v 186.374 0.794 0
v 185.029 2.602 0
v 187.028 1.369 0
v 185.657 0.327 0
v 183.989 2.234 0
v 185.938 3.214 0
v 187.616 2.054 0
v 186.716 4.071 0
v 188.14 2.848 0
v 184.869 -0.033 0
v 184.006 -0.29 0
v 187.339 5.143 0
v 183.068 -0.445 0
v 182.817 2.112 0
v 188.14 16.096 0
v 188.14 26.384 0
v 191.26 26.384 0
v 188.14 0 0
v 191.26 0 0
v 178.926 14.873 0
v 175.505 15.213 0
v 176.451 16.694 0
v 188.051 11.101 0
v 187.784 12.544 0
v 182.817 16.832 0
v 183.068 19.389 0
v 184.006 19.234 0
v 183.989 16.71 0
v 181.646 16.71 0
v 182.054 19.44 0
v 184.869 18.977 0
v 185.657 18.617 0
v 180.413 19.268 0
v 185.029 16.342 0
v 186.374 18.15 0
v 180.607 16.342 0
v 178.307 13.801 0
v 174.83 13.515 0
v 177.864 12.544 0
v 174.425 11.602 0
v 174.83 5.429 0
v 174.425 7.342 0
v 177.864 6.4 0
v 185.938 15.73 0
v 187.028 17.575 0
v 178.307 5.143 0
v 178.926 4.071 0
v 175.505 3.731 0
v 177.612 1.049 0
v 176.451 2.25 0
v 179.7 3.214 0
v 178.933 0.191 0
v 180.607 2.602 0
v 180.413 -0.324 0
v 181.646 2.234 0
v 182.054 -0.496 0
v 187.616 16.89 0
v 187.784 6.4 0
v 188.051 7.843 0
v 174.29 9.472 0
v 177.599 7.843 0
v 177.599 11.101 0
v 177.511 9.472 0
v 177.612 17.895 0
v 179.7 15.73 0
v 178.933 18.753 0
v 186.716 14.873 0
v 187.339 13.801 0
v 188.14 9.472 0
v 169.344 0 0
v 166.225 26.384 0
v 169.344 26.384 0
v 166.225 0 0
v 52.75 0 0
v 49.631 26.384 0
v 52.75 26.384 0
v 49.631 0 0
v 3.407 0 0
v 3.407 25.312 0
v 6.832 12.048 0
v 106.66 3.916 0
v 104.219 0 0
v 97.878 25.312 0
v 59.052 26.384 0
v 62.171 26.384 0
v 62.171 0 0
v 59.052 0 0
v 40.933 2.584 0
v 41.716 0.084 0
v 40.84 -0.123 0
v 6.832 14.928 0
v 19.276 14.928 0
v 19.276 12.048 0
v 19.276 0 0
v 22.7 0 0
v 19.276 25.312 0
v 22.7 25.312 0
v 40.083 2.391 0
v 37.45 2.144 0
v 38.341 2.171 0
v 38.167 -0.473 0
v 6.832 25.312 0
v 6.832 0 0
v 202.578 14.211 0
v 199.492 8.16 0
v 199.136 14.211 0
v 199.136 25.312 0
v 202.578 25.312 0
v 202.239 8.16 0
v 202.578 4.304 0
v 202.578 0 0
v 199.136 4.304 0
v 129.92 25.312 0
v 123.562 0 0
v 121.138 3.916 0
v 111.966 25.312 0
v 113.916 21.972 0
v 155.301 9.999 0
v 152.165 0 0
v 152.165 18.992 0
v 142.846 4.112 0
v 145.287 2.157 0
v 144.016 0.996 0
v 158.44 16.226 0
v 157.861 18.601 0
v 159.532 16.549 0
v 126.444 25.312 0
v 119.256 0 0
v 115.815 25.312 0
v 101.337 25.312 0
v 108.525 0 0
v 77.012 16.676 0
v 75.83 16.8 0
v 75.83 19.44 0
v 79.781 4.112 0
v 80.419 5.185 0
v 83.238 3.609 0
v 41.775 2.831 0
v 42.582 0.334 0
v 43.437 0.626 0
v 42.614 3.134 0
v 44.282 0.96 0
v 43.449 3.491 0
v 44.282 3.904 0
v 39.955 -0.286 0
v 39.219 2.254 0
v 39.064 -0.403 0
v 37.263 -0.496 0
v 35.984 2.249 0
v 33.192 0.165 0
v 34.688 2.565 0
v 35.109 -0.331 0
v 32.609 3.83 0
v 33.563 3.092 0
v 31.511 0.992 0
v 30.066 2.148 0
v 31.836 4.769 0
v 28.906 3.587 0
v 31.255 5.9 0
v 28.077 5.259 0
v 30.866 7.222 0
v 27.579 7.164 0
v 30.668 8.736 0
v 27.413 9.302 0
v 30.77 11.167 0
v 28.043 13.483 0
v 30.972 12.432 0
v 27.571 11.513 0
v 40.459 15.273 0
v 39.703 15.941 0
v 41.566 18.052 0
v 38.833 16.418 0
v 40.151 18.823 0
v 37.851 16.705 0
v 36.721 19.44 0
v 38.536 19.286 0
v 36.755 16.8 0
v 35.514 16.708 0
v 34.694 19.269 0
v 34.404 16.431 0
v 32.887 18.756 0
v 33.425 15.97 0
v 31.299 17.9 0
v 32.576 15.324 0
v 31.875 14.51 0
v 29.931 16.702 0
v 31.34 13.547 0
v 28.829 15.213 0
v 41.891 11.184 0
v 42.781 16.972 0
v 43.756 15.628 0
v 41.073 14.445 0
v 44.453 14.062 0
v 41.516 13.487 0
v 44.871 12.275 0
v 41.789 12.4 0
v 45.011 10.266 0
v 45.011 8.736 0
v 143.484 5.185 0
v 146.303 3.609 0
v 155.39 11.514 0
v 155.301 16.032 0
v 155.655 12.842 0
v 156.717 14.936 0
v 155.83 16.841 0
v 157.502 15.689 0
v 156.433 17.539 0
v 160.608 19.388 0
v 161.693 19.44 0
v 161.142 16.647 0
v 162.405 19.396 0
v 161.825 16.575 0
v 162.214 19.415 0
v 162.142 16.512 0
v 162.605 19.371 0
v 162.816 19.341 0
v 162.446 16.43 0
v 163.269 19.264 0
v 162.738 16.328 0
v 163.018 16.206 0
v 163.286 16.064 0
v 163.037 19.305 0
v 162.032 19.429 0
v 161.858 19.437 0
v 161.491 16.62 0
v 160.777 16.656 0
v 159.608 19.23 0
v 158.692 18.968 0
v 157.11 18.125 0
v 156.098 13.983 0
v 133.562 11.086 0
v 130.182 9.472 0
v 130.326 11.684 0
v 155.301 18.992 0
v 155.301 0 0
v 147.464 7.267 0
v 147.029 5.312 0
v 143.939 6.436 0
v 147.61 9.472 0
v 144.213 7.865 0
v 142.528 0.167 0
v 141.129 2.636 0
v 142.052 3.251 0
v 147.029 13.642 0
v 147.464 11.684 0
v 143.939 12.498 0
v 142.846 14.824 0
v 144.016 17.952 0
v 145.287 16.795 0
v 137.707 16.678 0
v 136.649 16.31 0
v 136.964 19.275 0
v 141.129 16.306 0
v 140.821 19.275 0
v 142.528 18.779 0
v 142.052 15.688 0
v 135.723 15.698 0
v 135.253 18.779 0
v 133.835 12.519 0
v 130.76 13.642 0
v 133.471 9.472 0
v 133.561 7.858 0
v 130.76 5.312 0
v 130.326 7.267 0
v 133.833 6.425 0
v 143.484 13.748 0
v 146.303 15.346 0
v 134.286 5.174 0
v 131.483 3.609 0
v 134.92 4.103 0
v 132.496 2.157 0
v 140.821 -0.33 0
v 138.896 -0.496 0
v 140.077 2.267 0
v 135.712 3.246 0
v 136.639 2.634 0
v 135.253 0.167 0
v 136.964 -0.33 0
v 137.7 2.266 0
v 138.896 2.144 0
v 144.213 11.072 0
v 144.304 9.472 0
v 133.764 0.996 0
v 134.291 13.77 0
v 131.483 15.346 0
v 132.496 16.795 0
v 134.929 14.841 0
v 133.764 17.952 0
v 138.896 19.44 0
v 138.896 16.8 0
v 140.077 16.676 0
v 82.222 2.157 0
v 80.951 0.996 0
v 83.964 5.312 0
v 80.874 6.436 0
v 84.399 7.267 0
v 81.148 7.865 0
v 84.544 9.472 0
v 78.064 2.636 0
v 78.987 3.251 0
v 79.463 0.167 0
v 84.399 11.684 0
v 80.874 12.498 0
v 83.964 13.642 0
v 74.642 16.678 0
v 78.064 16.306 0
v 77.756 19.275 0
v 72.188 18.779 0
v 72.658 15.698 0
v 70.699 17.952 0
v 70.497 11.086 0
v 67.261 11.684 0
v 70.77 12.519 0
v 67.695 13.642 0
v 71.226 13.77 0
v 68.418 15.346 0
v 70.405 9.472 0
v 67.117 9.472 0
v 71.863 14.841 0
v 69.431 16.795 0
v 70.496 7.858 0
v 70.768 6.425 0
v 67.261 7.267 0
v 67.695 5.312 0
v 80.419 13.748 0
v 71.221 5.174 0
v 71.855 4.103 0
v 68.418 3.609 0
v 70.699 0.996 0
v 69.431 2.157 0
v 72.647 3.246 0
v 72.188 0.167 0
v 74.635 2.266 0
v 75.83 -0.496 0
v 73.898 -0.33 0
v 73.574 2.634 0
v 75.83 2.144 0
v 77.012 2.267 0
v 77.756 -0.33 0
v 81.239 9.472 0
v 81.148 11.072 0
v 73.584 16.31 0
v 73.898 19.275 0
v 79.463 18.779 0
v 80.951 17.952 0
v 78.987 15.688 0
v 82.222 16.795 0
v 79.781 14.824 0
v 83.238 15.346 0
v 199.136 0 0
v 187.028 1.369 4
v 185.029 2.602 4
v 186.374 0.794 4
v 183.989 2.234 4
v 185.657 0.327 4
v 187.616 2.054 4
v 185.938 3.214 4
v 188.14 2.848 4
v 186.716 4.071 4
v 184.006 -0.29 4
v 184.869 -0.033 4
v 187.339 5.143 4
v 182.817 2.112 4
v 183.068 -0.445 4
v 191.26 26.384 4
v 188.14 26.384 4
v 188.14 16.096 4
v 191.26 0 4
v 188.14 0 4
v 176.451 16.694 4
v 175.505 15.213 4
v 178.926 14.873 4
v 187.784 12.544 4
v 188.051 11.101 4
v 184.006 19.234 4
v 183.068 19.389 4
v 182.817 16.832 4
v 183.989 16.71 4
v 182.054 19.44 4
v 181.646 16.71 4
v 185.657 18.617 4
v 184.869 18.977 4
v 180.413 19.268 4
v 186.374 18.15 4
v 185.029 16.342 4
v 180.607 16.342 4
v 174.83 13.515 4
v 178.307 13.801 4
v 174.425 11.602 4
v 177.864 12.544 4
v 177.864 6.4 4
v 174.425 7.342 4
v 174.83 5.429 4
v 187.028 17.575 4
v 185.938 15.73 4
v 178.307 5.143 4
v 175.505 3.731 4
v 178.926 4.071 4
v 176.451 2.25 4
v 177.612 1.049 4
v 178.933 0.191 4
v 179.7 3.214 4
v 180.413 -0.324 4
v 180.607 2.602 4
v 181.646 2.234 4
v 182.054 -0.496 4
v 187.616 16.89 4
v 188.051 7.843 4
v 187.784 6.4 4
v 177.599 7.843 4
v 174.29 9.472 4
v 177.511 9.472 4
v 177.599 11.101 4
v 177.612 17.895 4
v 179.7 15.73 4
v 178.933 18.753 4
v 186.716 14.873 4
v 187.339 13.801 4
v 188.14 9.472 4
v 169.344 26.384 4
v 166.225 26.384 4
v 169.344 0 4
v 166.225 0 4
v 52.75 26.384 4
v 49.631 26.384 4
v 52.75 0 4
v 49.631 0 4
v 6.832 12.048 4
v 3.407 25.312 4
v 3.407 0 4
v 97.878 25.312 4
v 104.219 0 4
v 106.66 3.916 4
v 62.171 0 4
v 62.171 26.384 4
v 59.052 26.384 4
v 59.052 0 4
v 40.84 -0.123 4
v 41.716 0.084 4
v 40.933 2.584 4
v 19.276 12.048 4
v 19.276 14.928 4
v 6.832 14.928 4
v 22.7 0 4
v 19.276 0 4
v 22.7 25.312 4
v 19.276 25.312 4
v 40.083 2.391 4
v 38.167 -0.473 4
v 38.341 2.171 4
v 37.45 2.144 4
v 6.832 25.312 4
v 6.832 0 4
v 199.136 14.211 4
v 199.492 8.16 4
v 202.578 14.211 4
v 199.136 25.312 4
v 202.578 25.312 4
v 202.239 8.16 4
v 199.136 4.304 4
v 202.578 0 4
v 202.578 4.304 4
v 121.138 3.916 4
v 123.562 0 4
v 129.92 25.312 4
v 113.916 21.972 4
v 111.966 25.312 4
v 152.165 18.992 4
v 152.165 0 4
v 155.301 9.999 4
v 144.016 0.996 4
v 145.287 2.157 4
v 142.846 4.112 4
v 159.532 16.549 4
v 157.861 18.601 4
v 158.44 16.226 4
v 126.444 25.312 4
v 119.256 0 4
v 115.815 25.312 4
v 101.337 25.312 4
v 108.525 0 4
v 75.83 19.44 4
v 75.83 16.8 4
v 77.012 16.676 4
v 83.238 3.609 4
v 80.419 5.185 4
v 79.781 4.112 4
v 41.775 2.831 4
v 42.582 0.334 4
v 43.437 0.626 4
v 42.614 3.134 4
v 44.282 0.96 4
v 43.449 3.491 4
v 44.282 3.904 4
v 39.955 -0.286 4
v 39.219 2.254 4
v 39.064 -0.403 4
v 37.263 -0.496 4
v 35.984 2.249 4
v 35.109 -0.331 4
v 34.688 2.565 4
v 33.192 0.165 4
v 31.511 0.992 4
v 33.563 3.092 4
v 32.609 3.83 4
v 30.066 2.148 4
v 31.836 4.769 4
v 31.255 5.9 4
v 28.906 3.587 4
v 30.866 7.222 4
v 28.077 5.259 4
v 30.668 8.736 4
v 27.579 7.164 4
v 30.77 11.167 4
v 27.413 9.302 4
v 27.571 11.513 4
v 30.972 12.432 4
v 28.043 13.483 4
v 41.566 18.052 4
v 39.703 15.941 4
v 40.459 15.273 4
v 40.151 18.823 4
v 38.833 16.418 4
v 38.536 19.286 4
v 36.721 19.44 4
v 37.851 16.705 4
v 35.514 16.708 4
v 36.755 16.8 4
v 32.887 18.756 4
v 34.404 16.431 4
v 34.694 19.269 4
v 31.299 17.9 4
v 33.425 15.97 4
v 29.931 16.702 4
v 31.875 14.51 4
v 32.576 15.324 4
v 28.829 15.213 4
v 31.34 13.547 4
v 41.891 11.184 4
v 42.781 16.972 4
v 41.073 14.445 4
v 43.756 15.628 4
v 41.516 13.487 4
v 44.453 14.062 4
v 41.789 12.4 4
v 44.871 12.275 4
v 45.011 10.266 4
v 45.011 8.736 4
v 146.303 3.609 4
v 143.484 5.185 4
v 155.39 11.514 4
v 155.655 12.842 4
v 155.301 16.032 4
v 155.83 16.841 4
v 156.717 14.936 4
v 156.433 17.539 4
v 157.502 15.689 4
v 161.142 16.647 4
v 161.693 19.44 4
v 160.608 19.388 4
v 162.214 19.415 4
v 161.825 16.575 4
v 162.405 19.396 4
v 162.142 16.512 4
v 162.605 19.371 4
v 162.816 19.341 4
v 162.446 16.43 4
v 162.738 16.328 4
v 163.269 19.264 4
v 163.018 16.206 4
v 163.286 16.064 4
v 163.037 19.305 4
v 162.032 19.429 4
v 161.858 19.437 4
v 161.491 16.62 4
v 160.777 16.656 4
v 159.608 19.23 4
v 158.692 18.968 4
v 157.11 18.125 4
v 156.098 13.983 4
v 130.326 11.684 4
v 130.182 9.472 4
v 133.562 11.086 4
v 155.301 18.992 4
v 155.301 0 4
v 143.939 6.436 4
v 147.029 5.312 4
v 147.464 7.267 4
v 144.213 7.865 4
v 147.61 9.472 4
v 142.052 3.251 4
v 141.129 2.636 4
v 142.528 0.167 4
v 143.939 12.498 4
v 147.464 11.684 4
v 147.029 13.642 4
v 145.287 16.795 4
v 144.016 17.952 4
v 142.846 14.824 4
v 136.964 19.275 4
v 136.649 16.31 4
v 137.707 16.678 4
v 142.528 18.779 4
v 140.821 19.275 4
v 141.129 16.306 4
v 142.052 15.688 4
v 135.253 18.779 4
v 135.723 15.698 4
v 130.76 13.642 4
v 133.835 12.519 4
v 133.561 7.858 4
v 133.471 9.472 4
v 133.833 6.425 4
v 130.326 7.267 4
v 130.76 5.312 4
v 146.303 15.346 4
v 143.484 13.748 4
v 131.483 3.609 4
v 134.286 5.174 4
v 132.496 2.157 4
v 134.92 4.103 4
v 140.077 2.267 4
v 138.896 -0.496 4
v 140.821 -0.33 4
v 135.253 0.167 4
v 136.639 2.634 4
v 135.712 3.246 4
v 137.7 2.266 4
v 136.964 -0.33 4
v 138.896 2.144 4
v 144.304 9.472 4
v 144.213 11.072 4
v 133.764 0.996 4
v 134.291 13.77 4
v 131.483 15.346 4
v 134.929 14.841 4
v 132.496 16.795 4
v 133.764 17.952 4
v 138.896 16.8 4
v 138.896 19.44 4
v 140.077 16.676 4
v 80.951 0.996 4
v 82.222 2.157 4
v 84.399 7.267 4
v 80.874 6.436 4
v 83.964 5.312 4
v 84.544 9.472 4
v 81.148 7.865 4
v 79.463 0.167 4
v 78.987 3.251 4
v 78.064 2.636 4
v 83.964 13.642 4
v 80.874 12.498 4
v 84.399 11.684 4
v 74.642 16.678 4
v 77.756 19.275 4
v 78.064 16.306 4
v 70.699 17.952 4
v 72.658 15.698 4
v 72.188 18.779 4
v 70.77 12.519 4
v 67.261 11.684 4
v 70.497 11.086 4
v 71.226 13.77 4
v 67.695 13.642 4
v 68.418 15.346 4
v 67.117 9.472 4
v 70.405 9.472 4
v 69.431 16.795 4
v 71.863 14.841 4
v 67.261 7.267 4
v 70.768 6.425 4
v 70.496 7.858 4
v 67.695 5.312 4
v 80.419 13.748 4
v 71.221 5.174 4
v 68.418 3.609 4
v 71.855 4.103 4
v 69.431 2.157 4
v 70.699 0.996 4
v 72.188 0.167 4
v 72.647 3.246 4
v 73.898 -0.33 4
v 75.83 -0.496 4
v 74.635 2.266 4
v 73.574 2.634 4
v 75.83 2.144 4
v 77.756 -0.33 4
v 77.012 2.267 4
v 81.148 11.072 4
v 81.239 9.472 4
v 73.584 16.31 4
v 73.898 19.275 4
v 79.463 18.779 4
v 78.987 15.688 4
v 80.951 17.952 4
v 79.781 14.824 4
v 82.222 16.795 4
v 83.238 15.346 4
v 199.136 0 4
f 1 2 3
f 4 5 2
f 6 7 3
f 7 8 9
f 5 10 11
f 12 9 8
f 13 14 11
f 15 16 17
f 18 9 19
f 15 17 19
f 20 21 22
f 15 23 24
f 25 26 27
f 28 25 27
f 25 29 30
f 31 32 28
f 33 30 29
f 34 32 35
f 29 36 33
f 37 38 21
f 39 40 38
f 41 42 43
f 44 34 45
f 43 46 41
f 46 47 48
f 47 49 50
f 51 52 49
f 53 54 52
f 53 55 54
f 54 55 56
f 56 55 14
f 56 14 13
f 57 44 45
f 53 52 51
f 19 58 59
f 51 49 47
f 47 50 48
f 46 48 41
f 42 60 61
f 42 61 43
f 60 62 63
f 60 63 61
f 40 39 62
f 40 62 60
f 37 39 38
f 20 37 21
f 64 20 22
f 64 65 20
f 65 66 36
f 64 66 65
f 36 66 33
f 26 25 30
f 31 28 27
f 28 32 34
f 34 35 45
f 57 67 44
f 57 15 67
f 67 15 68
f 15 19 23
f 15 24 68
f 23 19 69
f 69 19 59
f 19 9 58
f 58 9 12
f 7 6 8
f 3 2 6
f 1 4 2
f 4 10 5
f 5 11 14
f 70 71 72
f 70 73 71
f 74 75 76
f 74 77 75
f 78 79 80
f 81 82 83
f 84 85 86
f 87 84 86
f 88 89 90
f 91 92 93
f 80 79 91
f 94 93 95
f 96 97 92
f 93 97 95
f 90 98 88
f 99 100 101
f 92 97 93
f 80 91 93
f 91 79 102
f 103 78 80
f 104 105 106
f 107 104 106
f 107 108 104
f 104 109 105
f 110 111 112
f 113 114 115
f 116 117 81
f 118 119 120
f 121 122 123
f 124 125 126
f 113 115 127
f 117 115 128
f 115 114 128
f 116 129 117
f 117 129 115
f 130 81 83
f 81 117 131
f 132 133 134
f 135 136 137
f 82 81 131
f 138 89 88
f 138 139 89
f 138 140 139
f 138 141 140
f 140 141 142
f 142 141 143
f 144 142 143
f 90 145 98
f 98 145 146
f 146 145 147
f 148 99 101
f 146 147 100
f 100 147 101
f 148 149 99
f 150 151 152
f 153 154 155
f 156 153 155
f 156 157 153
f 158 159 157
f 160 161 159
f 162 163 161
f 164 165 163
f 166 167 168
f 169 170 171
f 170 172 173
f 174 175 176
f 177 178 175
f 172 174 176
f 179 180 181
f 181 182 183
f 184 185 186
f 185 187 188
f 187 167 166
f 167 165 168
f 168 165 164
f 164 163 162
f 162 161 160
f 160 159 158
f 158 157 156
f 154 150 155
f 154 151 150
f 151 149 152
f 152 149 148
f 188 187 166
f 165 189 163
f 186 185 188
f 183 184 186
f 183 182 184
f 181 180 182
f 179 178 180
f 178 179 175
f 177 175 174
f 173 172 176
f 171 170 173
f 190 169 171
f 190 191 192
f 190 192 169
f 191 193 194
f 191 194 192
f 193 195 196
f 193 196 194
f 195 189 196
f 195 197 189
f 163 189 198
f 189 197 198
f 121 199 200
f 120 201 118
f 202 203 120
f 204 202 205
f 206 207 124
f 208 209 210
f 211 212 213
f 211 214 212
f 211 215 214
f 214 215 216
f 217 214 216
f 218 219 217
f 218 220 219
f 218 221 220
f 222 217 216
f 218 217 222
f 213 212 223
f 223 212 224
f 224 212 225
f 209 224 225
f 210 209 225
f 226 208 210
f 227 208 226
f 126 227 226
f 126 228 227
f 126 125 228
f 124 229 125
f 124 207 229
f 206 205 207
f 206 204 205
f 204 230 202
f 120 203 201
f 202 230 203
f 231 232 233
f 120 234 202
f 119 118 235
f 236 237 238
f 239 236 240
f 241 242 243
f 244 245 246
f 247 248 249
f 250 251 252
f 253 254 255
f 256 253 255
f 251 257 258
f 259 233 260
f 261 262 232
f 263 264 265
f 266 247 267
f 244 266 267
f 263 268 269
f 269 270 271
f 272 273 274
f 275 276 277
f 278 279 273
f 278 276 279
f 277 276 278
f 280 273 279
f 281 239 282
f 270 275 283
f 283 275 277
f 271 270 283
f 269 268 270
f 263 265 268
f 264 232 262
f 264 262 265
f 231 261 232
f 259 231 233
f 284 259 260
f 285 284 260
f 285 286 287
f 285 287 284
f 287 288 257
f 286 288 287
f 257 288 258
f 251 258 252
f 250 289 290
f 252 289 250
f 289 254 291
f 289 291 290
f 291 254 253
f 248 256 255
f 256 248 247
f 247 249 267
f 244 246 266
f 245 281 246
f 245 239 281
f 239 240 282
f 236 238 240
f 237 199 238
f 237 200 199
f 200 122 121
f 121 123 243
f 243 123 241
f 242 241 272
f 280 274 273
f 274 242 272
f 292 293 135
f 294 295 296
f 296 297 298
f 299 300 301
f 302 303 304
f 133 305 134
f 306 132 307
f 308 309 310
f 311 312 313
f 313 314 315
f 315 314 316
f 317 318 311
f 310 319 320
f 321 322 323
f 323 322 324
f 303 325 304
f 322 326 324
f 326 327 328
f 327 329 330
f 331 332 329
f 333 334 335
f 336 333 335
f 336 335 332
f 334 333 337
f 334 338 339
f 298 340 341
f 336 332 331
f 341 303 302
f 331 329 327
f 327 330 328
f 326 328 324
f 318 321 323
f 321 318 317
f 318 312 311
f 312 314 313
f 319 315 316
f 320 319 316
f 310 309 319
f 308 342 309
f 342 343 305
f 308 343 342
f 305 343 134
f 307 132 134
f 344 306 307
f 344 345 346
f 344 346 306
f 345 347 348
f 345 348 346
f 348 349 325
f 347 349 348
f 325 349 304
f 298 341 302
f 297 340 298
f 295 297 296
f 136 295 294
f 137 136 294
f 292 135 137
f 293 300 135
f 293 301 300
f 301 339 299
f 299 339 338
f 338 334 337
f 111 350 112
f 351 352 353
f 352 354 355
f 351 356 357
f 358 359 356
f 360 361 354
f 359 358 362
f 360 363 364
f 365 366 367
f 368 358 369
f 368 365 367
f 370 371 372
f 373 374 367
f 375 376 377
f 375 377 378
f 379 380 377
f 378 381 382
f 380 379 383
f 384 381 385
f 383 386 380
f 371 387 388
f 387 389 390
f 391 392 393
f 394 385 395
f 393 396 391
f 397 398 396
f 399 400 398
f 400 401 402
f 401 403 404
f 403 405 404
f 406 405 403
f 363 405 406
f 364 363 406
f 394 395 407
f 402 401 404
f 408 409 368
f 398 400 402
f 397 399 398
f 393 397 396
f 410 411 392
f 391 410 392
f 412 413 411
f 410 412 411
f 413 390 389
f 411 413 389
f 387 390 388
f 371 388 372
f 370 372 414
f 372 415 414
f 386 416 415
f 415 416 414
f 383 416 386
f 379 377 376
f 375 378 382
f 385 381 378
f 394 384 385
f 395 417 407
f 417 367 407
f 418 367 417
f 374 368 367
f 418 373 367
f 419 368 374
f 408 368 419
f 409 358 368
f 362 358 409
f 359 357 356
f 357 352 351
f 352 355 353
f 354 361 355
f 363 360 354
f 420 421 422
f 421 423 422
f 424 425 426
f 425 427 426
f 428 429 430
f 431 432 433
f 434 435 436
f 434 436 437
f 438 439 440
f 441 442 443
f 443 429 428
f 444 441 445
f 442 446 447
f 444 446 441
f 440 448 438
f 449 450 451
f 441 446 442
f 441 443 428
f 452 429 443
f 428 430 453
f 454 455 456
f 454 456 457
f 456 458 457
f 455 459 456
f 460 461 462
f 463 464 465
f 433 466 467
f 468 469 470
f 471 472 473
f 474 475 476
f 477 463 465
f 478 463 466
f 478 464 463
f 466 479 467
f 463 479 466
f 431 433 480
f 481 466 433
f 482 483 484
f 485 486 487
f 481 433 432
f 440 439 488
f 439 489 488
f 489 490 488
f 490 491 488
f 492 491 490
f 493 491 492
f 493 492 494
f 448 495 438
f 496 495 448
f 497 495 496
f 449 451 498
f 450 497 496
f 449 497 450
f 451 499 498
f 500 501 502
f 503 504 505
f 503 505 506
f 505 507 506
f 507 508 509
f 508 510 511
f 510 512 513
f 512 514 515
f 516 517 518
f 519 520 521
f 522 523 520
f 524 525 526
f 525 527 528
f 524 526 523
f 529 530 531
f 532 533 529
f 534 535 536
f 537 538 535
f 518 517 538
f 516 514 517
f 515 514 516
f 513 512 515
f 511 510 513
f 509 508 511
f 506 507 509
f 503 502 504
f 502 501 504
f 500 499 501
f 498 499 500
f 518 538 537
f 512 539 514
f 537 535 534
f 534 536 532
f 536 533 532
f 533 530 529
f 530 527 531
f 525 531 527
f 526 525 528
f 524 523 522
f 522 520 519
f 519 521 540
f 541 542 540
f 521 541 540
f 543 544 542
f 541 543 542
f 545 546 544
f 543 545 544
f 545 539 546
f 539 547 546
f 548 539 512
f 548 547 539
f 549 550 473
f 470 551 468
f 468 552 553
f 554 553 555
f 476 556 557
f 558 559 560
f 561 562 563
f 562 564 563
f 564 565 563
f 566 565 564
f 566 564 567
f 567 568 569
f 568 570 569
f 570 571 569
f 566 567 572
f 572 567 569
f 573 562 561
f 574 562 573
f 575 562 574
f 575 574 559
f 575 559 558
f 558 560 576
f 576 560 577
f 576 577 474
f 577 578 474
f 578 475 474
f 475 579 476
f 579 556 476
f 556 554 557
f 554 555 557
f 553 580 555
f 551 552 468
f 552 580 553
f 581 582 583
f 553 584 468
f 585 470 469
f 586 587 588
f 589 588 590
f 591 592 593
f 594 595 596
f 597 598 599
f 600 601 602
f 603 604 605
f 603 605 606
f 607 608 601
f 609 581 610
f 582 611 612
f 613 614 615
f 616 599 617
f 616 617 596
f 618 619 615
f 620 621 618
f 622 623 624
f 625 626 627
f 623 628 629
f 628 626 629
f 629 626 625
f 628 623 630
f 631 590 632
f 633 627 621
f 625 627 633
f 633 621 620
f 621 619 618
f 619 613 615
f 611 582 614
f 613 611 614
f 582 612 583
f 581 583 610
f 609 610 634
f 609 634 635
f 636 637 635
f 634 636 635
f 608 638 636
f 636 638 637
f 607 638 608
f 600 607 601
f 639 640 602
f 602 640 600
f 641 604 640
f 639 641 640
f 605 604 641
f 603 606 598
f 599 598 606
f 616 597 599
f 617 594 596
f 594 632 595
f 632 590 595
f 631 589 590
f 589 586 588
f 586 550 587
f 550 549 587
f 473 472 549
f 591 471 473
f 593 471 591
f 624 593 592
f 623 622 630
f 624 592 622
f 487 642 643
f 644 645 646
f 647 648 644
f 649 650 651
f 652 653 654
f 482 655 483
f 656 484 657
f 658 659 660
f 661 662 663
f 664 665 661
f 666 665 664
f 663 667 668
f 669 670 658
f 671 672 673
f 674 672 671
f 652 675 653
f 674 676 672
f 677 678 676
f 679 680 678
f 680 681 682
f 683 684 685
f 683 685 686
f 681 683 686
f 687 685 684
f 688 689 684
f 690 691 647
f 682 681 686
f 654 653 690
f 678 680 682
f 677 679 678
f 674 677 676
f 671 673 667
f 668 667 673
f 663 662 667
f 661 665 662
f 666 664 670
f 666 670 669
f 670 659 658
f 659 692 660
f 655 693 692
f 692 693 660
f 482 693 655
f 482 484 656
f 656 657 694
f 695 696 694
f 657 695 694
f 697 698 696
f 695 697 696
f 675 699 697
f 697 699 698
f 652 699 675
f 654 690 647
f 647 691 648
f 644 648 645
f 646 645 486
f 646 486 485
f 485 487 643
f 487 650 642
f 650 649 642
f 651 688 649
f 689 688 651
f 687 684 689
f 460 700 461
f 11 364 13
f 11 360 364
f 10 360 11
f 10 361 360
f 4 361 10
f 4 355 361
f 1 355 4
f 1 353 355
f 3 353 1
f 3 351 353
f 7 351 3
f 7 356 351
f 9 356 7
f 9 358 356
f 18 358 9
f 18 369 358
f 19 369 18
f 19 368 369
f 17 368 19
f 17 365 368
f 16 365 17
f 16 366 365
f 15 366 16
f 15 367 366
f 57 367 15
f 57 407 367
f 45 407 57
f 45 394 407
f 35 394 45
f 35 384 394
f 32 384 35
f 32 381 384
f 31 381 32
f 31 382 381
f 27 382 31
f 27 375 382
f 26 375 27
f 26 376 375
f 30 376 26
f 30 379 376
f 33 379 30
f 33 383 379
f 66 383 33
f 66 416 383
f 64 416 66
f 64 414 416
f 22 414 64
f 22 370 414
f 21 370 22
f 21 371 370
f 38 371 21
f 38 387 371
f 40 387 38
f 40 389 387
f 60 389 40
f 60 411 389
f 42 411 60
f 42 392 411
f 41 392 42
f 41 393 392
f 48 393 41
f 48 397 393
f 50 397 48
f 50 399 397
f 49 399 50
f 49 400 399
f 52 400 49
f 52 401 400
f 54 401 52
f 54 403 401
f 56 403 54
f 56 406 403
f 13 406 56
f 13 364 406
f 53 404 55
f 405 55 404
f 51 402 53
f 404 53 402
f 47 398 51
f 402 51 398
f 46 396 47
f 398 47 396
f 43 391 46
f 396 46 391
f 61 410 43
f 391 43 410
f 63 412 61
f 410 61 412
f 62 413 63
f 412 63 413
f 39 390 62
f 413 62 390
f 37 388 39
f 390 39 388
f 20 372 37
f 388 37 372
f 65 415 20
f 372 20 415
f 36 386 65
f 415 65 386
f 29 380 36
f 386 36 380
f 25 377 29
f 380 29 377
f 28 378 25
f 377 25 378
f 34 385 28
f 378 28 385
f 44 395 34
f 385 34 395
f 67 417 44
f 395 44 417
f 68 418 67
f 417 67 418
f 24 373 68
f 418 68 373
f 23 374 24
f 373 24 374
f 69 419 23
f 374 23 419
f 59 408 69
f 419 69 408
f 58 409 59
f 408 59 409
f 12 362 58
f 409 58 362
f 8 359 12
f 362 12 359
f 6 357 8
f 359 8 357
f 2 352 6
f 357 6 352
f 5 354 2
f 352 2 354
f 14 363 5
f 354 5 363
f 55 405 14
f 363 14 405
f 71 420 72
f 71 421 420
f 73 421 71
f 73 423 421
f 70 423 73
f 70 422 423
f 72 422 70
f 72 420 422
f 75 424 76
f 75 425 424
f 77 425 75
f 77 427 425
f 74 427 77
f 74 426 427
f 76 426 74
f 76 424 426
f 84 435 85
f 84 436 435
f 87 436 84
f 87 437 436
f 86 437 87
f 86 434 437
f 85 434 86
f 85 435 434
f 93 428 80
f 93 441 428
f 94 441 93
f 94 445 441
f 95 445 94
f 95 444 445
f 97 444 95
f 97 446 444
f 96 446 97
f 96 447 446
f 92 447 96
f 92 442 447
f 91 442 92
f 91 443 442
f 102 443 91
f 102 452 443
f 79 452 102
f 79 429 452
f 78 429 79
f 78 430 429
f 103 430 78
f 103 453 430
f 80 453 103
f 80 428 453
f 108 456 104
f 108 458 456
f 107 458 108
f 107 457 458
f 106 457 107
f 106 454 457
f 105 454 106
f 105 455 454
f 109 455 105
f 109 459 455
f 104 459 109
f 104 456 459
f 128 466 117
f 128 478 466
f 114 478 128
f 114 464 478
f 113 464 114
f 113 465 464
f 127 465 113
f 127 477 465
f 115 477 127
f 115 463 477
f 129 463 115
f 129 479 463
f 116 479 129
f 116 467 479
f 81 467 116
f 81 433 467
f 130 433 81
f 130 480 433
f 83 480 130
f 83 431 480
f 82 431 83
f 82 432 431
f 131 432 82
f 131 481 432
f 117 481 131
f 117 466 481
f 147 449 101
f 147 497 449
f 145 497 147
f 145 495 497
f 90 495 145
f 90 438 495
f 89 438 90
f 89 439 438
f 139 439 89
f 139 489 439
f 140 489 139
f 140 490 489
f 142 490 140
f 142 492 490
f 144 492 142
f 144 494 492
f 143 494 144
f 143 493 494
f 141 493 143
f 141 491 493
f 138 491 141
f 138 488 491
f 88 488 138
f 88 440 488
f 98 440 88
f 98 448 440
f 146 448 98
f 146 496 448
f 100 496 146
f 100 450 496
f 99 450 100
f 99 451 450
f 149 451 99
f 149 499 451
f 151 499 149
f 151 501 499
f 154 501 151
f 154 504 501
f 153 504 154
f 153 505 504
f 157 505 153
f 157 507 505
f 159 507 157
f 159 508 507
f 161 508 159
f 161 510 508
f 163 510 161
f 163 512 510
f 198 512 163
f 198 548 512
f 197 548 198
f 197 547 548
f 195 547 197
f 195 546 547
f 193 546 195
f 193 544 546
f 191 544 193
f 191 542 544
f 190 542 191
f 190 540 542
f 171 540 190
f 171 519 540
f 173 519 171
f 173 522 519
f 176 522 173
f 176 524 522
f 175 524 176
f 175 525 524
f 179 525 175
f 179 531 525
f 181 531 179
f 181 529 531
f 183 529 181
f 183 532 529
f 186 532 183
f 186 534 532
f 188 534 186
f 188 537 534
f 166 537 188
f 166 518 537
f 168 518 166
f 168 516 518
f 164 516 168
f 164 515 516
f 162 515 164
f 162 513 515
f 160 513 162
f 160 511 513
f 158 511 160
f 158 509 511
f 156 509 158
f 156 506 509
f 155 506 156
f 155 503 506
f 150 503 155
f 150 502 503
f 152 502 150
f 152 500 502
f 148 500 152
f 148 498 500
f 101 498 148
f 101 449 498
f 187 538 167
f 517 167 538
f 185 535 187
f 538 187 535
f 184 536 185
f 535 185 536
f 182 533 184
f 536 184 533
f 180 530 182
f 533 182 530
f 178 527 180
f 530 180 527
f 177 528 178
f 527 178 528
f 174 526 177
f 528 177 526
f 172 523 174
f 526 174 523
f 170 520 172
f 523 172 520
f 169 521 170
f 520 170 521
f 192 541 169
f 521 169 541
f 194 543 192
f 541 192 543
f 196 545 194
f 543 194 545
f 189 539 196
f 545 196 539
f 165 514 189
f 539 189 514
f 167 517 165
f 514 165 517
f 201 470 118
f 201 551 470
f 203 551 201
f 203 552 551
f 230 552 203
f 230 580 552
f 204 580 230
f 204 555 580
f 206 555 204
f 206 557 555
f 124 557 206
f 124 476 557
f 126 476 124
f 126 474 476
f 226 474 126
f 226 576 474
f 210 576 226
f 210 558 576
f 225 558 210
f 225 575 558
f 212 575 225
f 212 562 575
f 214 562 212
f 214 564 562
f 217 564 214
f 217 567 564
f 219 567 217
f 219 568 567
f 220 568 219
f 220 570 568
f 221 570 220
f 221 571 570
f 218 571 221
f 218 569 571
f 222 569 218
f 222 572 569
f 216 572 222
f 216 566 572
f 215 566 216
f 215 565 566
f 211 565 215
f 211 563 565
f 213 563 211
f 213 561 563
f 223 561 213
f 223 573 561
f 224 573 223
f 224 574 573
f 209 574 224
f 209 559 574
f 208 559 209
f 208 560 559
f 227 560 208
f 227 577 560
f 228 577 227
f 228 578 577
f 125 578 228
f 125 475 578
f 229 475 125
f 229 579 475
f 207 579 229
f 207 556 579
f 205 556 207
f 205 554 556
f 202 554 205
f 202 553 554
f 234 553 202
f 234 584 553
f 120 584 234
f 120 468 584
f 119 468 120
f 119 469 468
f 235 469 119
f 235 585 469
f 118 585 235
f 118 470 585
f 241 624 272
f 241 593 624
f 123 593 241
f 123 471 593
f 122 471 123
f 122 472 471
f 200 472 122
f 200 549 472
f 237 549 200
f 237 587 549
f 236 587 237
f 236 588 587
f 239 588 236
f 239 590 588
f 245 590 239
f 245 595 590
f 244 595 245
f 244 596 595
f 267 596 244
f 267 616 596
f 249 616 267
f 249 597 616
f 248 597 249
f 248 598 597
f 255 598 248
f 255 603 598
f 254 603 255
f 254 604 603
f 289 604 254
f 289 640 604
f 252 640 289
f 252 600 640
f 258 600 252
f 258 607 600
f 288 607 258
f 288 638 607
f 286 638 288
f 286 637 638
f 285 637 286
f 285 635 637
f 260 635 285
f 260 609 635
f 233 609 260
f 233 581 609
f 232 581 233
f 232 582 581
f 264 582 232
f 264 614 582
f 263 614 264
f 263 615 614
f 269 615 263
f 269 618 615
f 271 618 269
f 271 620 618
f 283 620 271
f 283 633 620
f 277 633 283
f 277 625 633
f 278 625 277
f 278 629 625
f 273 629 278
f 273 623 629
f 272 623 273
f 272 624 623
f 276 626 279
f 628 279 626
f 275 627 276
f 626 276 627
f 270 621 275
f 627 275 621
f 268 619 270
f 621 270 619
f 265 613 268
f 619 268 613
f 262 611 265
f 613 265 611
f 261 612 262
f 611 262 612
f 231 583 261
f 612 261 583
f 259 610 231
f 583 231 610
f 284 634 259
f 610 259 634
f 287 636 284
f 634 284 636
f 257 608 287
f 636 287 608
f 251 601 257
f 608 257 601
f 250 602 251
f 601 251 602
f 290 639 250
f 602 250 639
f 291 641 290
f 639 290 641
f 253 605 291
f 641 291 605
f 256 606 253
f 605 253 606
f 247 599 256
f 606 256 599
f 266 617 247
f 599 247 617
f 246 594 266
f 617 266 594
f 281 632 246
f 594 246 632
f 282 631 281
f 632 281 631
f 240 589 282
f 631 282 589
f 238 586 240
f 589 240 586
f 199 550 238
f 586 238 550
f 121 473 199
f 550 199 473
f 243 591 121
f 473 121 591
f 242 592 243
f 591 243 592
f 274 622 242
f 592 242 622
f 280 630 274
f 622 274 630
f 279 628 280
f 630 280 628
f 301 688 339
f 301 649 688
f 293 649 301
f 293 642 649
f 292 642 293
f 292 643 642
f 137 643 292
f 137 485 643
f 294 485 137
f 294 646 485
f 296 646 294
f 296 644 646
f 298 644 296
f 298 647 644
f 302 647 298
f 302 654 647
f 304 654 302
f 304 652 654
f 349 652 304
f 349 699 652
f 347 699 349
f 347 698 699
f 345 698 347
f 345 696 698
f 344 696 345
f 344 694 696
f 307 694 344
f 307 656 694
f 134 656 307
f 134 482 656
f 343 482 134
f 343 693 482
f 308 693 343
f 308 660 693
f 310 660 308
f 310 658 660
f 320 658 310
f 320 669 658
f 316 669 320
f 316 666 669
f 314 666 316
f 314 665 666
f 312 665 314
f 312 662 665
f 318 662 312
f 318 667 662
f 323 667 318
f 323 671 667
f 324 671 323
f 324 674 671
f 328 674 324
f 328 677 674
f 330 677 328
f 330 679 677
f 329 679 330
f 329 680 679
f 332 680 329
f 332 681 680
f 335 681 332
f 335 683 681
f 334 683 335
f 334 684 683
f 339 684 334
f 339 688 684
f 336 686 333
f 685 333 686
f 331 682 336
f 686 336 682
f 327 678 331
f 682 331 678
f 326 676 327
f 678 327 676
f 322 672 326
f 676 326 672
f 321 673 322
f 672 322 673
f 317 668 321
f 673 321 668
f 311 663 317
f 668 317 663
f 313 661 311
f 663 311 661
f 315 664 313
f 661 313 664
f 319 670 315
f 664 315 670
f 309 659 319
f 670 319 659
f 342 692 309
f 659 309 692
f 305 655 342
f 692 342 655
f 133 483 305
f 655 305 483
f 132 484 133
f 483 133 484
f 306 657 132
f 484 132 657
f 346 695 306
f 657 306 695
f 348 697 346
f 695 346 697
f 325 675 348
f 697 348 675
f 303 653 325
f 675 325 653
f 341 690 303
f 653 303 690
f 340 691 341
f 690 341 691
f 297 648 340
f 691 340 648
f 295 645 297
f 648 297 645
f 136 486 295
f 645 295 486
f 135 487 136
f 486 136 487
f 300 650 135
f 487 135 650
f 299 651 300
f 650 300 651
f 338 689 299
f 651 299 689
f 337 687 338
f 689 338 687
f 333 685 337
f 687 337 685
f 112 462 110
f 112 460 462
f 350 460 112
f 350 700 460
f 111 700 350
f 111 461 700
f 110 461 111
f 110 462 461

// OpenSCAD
//fonttyp="font awesome 5 brands";
//fonttyp="font helvetica";
//fonttyp="font arial";
//fonttyp="tohoma:style=bold";
fonttyp="verdana:style=bold italic";

fontsize=25;
writtentext="Hello World!";

linear_extrude(4)
text(writtentext,font=fonttyp, size=fontsize);
